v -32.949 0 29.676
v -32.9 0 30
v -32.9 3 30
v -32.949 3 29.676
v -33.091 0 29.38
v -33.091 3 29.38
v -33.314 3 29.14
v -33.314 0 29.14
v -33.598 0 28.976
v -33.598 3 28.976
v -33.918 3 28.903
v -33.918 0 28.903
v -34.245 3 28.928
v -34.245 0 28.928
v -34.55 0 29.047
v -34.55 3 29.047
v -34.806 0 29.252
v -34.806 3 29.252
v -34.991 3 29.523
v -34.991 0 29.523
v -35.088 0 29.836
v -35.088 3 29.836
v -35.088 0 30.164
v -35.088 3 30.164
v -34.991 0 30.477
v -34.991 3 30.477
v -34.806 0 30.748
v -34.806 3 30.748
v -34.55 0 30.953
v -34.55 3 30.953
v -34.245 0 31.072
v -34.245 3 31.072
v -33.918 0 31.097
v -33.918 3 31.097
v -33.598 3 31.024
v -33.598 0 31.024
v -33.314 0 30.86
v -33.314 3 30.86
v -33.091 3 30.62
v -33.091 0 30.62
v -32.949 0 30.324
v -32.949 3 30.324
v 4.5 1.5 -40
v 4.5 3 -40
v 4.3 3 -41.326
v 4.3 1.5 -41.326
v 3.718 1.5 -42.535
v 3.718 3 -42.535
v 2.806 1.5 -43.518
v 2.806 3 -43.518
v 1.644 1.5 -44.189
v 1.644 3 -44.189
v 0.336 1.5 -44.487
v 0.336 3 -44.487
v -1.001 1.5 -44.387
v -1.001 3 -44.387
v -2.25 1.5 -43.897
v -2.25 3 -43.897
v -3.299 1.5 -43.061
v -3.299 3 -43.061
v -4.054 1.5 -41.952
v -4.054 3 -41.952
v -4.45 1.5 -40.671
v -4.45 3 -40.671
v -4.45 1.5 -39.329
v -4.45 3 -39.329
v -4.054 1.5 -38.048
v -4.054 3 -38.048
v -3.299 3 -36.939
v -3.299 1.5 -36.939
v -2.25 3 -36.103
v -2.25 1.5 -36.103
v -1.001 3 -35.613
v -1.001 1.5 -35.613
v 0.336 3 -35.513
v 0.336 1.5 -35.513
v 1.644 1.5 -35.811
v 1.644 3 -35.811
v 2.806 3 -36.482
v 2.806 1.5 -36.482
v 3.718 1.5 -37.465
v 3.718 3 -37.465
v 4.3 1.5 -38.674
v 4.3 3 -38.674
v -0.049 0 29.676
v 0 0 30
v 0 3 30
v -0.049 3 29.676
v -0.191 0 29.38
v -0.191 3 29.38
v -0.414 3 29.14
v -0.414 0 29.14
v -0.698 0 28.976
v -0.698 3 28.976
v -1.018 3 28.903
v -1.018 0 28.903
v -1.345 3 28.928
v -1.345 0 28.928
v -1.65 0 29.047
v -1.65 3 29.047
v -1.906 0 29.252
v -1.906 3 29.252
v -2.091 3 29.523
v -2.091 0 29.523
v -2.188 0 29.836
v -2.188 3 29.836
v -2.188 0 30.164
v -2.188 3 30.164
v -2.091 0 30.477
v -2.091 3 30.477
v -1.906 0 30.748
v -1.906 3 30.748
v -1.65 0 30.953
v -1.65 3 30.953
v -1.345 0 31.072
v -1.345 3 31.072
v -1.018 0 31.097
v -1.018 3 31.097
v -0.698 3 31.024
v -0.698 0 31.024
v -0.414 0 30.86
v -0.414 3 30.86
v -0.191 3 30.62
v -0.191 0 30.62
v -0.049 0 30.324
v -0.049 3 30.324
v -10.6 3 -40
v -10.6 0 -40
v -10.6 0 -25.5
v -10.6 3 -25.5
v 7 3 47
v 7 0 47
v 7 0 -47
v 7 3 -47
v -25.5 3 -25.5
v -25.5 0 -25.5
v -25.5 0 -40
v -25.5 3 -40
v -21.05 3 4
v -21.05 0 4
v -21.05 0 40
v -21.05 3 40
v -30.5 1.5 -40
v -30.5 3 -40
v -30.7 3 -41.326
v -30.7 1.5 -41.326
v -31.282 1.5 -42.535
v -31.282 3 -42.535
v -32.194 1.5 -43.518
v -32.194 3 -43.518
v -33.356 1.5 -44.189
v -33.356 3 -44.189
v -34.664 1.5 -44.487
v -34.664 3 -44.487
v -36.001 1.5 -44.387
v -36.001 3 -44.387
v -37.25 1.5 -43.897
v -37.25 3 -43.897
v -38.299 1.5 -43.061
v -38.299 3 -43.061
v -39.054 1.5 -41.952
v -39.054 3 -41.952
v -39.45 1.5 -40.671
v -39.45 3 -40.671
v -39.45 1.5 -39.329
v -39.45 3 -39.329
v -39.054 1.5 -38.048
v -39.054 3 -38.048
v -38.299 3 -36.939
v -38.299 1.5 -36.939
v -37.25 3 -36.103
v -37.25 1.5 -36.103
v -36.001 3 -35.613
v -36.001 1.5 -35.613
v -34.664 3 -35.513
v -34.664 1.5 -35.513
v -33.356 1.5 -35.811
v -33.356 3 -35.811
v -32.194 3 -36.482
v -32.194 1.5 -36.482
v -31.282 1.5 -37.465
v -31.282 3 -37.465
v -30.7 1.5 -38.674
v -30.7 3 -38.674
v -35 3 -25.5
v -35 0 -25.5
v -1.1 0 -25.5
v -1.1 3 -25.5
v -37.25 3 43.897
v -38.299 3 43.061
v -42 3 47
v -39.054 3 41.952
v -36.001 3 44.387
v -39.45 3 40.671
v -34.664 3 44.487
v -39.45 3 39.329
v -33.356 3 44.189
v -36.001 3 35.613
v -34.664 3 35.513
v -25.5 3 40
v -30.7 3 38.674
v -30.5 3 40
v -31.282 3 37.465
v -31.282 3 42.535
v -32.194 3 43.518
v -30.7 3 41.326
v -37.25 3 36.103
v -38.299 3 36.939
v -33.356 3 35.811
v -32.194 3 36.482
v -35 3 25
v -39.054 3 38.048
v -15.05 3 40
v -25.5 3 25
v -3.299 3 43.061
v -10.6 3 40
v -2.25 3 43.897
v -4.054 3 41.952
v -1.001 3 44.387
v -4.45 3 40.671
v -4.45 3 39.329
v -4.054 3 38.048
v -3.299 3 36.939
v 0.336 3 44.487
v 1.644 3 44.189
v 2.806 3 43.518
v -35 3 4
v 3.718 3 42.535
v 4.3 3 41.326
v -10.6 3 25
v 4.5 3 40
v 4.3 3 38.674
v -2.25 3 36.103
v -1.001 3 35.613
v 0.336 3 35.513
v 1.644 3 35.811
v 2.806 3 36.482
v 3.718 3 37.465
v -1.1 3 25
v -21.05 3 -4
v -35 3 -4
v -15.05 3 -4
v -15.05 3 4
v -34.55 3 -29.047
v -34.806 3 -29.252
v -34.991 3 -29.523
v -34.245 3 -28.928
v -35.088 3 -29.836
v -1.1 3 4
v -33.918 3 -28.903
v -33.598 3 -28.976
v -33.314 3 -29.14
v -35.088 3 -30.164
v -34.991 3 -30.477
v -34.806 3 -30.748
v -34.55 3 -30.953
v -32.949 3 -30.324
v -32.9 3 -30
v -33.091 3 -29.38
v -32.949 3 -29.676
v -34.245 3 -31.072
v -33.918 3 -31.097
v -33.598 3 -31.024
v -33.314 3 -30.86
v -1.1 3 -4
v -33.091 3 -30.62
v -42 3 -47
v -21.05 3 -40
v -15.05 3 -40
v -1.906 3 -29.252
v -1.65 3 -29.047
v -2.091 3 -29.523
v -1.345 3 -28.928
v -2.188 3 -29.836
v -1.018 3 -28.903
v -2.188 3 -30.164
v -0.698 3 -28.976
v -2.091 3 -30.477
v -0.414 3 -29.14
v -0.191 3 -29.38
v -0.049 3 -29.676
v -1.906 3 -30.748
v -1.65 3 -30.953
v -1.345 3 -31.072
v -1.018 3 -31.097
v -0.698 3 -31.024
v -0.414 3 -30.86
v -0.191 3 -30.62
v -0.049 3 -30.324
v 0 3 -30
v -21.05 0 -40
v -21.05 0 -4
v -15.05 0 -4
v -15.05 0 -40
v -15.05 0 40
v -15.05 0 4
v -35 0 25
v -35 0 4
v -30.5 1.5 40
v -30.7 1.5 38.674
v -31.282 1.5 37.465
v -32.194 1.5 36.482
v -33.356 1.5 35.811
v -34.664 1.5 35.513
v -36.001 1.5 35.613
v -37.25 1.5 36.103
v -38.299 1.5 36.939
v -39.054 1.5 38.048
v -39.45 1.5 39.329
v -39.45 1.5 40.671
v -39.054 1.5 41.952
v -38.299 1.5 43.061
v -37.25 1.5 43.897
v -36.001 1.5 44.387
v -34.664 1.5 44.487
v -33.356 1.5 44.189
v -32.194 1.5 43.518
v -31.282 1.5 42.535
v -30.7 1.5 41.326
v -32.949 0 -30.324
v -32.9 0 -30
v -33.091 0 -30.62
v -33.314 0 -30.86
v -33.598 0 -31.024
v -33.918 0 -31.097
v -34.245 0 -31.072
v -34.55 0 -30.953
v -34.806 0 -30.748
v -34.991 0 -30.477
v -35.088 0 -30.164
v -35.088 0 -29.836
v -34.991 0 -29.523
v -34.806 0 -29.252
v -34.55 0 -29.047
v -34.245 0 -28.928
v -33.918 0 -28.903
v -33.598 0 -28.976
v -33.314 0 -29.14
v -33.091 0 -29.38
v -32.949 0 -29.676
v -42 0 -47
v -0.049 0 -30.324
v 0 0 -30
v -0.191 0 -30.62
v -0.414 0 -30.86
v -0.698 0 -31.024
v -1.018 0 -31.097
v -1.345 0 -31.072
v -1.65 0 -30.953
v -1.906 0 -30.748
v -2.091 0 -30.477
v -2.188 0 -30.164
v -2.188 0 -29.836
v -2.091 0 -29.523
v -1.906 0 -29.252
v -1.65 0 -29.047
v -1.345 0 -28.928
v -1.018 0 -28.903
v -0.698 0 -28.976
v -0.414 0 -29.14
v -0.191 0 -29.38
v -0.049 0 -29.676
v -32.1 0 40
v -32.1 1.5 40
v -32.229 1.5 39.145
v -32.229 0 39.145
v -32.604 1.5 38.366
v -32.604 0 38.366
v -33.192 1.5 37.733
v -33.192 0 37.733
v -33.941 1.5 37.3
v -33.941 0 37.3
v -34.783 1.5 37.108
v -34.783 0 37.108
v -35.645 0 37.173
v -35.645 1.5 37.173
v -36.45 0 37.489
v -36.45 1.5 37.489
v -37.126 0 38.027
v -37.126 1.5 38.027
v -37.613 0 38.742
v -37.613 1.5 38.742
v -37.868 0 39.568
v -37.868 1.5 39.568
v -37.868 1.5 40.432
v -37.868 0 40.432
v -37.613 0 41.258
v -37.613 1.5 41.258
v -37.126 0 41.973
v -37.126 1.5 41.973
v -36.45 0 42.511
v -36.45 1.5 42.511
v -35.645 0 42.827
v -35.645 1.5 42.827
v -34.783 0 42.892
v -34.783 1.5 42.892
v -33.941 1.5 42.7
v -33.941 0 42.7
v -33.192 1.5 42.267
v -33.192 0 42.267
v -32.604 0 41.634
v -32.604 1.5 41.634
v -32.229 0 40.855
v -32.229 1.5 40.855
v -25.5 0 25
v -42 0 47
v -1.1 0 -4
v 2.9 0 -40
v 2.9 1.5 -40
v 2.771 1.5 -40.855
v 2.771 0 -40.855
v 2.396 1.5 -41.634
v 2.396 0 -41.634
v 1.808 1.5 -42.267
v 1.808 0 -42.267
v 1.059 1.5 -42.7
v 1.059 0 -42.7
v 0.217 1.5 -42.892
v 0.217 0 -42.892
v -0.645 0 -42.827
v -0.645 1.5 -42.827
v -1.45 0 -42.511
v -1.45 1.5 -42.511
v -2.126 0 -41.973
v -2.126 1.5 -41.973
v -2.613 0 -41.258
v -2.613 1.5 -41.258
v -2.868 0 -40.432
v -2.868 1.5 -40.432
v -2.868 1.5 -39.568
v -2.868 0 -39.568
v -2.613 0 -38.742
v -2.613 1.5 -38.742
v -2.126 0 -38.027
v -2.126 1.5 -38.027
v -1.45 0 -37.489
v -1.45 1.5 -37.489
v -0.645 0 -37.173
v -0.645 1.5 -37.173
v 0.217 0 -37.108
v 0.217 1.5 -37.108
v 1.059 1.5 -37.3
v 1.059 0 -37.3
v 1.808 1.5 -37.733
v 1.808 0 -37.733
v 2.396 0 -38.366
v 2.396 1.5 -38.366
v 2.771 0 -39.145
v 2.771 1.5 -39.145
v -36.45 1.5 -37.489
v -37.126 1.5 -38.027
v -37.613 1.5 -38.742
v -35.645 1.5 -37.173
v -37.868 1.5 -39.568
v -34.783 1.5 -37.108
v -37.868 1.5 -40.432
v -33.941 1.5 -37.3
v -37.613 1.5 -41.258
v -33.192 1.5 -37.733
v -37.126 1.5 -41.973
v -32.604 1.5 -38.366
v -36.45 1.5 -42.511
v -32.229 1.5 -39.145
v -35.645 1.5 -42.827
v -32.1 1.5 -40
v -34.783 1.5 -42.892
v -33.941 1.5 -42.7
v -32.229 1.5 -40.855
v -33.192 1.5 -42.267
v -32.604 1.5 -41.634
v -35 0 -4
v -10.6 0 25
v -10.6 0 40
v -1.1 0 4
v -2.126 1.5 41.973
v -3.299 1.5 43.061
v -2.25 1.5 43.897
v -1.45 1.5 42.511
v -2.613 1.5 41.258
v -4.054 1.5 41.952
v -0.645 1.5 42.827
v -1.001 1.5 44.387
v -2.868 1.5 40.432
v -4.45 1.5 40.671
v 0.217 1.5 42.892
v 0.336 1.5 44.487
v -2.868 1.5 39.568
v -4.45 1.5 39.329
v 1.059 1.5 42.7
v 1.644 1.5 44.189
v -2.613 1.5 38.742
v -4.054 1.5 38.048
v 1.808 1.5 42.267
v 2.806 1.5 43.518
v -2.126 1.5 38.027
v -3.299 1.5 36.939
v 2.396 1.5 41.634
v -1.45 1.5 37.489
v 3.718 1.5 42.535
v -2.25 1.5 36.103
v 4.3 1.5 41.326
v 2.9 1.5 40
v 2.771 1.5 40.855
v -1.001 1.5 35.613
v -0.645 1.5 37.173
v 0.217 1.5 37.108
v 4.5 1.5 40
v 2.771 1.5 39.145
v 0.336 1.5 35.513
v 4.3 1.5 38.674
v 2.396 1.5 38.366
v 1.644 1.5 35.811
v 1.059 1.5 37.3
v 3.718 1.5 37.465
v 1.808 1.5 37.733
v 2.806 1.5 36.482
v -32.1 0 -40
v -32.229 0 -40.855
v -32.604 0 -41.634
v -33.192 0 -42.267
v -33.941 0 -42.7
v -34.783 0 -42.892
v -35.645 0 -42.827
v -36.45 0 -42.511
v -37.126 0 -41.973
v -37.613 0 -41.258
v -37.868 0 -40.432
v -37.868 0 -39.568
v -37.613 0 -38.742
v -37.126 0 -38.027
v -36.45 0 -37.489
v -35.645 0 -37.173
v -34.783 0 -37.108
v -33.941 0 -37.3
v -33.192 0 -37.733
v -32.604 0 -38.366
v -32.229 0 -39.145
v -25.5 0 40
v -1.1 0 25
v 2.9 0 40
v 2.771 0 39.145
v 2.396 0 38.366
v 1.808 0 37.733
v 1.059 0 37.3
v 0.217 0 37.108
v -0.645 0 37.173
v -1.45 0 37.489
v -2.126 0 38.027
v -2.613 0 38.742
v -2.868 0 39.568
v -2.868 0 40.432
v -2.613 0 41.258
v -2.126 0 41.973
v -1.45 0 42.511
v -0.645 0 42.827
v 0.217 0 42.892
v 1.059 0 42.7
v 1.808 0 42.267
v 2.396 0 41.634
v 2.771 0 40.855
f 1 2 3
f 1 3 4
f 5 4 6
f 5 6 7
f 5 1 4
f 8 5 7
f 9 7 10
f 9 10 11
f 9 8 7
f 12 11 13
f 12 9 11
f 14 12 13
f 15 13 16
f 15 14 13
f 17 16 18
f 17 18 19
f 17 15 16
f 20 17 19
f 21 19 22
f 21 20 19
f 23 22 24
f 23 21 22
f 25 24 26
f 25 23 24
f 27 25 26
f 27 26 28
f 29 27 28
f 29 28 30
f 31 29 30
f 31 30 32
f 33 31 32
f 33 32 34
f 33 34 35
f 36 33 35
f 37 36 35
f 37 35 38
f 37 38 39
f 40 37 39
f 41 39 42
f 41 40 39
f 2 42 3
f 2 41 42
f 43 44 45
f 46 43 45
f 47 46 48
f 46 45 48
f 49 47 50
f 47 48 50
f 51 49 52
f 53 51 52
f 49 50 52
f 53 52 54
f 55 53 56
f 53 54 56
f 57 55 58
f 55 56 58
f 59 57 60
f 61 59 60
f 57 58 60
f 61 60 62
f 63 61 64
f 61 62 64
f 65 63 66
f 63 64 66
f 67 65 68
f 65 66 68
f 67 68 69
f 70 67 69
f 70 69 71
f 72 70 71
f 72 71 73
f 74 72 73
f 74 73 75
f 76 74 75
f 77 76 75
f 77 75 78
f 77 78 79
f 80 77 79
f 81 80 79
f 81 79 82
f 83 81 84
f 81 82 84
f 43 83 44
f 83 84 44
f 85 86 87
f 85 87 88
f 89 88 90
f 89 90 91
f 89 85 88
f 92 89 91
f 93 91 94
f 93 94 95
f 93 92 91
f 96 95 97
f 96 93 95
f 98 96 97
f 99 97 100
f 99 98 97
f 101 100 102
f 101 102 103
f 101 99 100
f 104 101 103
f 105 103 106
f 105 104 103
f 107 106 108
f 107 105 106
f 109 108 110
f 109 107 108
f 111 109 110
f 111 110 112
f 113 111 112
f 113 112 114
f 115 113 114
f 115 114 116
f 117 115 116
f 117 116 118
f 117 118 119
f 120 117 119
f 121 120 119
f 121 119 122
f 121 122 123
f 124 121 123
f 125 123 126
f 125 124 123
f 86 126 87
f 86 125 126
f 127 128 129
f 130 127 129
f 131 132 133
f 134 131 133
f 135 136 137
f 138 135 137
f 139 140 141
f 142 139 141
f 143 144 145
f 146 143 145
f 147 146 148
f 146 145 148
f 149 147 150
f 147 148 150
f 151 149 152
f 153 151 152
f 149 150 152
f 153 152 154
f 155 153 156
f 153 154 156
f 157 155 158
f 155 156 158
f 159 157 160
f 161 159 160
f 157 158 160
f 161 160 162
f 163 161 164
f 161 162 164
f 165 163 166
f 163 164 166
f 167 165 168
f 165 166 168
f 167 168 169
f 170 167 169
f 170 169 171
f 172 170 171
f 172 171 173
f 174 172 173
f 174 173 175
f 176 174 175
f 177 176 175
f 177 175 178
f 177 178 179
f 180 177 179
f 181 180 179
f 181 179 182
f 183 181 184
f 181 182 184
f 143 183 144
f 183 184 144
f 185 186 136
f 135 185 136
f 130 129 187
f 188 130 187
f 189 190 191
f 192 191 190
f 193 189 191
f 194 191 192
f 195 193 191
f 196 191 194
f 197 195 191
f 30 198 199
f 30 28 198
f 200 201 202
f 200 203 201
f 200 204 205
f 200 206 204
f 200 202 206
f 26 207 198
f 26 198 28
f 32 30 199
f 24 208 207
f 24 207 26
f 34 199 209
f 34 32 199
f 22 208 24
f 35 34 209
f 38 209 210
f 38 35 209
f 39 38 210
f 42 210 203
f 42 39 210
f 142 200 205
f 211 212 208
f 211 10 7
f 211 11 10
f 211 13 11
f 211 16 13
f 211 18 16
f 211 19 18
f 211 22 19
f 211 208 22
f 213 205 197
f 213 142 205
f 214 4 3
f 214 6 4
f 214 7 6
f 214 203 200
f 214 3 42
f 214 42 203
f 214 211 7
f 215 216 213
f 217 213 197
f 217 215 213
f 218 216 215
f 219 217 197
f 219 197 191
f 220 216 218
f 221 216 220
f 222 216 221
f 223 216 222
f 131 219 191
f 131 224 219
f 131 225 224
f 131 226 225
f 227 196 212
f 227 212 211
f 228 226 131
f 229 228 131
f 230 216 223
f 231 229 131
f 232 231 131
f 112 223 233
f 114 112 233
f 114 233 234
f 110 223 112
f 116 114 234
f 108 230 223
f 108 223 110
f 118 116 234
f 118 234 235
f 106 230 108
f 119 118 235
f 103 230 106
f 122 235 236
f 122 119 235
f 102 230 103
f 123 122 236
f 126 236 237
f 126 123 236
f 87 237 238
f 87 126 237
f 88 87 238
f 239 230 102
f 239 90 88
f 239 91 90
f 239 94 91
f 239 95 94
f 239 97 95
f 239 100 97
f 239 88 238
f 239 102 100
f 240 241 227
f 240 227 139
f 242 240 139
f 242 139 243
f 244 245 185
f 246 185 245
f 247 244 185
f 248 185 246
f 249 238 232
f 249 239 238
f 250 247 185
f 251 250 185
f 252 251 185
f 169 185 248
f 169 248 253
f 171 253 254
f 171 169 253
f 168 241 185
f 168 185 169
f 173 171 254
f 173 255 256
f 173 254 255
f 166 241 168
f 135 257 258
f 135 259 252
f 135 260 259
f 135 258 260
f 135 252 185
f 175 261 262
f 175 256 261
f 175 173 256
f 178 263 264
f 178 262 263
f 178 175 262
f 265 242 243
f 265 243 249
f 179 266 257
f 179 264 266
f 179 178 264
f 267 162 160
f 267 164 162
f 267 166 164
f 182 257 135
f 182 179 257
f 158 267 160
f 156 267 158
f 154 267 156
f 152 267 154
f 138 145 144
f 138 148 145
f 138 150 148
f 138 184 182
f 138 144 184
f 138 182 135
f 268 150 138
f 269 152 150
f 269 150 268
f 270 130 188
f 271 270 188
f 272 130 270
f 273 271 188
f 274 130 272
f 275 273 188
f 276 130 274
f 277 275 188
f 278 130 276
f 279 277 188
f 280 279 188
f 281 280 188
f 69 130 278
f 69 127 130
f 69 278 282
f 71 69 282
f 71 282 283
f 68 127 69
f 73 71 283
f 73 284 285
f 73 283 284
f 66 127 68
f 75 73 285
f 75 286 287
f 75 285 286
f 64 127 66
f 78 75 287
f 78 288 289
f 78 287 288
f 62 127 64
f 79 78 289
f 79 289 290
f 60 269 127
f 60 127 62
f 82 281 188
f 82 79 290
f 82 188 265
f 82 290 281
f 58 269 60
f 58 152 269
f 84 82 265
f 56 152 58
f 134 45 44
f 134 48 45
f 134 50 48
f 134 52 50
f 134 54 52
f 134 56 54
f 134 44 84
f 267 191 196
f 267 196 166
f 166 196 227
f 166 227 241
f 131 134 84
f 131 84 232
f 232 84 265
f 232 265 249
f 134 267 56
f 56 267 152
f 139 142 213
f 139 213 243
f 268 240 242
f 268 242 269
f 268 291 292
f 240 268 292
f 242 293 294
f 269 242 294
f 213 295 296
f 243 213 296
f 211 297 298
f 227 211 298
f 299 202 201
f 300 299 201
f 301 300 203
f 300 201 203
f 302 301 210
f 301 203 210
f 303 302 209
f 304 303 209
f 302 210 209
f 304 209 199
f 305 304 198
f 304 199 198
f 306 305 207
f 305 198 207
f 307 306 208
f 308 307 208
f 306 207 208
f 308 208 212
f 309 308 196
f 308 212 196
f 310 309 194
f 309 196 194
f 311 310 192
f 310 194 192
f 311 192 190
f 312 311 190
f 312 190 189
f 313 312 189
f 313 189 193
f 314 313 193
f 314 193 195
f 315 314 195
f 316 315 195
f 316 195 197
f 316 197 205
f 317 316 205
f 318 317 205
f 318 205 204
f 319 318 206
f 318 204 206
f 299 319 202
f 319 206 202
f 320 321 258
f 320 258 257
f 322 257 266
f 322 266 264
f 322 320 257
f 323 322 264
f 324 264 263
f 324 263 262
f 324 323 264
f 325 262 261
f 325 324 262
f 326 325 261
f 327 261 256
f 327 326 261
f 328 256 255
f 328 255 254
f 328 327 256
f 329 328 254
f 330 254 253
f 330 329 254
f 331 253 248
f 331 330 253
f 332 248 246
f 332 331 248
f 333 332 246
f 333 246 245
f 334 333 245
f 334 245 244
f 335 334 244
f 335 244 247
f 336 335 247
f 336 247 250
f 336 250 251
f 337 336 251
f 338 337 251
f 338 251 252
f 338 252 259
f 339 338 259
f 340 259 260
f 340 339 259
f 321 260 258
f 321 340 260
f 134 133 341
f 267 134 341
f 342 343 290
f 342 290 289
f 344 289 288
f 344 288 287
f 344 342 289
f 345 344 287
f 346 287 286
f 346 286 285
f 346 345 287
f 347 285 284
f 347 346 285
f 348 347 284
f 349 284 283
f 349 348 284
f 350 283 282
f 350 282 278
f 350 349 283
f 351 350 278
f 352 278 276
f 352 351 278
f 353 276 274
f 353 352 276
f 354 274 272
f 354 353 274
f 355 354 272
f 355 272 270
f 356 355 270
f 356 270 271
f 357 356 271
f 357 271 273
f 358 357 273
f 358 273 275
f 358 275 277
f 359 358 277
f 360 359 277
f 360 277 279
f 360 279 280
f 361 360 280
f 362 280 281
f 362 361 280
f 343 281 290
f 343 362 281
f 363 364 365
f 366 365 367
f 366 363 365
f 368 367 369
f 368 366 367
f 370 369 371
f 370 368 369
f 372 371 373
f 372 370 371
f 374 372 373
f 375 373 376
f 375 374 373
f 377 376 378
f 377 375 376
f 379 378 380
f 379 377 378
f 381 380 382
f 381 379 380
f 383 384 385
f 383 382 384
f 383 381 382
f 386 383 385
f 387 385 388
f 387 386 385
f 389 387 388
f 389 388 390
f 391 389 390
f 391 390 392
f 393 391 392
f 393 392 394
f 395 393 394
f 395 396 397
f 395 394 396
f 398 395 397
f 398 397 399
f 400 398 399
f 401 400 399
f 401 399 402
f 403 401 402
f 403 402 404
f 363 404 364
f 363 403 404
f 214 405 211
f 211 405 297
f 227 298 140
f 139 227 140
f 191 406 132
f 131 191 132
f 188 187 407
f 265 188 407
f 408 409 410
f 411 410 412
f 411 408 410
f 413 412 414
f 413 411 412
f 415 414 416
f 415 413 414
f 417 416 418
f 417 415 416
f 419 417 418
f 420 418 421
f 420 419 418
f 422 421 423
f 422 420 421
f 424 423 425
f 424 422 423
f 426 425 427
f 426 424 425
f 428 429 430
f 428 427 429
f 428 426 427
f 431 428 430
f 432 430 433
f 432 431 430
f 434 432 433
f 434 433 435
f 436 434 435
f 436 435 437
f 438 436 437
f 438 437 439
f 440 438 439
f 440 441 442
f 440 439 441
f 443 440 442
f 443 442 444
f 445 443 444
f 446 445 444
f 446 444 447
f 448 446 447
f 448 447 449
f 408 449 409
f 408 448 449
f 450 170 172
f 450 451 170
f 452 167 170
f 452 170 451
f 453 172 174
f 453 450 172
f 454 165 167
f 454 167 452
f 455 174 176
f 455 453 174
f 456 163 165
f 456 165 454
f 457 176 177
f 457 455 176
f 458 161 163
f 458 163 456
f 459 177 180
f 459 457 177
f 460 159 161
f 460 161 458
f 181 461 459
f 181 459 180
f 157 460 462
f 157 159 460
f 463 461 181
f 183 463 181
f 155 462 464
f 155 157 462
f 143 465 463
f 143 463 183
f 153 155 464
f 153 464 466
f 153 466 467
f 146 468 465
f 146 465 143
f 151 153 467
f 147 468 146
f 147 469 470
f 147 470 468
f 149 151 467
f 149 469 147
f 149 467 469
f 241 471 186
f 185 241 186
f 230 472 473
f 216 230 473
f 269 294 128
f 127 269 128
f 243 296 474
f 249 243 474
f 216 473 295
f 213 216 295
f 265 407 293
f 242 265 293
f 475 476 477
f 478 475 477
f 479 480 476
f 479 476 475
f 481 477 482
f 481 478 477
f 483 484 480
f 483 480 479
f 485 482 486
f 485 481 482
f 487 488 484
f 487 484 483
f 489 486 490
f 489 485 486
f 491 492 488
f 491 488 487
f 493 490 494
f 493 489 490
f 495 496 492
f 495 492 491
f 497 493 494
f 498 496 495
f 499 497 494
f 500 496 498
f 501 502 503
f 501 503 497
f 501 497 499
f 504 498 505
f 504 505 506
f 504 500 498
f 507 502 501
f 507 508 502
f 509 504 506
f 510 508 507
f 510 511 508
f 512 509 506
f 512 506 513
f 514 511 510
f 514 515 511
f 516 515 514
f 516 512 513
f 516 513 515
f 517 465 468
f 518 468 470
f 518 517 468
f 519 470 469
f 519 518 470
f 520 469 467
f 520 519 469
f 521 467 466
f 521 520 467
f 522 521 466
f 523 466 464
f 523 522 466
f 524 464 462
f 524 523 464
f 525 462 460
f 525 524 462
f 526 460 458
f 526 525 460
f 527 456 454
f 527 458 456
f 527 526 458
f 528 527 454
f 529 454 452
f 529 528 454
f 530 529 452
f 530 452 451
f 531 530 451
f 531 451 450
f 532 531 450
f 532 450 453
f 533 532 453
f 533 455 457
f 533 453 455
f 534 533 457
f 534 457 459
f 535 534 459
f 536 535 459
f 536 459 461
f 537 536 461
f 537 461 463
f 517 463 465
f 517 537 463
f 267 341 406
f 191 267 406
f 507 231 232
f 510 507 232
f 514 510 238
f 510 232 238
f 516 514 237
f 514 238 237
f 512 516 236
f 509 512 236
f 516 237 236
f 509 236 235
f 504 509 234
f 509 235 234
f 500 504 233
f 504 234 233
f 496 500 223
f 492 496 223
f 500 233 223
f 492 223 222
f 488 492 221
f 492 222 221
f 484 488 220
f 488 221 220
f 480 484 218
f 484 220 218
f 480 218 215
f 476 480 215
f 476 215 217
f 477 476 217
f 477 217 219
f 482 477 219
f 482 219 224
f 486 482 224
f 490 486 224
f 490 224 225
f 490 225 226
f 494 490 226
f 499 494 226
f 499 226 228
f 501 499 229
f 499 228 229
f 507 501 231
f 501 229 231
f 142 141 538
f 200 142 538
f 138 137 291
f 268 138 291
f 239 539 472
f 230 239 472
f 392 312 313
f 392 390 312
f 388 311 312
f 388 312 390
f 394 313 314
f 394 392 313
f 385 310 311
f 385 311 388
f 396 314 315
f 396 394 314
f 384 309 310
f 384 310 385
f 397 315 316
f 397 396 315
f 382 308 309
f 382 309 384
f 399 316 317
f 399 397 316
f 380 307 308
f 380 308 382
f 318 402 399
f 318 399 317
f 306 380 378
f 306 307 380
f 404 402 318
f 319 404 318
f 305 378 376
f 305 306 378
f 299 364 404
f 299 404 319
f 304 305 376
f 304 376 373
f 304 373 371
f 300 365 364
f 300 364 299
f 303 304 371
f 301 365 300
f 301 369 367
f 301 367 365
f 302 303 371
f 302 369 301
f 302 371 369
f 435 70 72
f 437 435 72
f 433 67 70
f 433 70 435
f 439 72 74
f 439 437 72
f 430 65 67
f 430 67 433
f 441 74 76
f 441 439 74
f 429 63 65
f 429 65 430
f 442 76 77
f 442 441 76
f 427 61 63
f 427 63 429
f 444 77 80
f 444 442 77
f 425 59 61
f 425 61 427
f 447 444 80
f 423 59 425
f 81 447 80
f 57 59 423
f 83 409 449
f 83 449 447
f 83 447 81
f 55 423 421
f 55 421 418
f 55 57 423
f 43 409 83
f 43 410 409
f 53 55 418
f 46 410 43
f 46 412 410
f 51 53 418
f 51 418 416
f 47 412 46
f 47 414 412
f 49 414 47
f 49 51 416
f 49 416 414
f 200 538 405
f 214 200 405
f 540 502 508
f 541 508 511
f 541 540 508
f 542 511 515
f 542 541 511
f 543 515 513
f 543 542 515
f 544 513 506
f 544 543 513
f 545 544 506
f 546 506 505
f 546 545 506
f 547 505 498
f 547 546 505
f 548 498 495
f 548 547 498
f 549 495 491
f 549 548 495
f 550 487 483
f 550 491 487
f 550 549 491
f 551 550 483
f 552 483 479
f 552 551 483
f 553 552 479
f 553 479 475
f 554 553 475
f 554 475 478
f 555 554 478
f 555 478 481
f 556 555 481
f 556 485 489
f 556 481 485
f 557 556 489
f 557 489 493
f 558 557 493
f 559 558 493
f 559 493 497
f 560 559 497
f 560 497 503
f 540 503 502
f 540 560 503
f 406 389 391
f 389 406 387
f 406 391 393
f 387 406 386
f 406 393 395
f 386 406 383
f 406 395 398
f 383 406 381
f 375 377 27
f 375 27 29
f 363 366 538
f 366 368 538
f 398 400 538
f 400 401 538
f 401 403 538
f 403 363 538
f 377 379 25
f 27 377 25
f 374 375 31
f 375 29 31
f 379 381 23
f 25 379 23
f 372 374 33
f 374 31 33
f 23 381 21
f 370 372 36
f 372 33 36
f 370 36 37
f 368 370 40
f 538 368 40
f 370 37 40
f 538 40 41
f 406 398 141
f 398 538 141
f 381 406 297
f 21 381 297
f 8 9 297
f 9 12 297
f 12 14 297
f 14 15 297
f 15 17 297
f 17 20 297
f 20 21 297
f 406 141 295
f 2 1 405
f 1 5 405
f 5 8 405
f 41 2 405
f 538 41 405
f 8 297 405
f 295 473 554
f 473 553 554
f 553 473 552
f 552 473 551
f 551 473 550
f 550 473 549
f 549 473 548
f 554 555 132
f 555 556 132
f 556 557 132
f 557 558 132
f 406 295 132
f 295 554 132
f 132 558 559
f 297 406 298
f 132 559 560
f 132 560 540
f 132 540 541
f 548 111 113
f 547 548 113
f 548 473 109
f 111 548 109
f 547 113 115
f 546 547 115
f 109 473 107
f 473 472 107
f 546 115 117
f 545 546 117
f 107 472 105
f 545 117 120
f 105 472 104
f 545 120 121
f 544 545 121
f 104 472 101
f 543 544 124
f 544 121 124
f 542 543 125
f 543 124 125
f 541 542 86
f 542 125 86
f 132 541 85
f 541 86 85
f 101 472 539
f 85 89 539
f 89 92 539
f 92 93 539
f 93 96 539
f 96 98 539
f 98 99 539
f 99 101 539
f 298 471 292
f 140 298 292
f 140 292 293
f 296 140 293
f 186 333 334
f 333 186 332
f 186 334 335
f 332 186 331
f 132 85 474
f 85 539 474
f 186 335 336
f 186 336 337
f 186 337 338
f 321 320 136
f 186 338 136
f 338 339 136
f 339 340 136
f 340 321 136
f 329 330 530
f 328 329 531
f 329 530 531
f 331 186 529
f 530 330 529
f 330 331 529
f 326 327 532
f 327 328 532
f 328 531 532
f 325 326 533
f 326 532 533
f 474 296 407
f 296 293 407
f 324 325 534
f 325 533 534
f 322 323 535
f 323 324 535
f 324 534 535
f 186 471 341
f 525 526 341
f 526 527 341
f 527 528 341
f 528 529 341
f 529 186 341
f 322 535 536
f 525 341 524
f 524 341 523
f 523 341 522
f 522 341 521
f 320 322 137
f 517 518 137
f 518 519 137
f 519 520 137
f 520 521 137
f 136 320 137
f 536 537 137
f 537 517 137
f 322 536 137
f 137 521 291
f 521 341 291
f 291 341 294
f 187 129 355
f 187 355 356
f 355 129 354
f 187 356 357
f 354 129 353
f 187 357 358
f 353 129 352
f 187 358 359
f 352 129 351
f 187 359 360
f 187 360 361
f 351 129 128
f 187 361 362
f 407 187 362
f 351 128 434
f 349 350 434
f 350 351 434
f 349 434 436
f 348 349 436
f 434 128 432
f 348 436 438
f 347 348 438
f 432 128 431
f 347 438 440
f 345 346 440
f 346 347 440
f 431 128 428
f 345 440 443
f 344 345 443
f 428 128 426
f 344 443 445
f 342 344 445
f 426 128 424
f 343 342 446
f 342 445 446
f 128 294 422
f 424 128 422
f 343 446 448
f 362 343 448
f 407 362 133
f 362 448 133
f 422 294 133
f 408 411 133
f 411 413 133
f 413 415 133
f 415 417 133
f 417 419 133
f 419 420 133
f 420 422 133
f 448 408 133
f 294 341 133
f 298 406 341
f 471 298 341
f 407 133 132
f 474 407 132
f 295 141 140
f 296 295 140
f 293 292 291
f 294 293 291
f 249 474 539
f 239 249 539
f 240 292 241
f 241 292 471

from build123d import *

# Parameters (mm, degrees)
SKETCH_1_R          = 2.9
SKETCH_1_R_2        = 1.1
EXTRUDE_1_DEPTH     = 3
SKETCH_2_R          = 4.5
CUT_EXTRUDE_1_DEPTH = 1.5


with BuildPart() as part:
    # 草图1 → 凸台-拉伸1 (new body)
    with BuildSketch(Plane(origin=(0, 0, 0), x_dir=(1, 0, 0), z_dir=(0, 1, 0))):
        Polygon((-42, 47), (-42, 0), (-42, -47), (0, -47), (7, -47), (7, 47), (0, 47), align=None)
        with Locations((-35, -40)):
            Circle(SKETCH_1_R, mode=Mode.SUBTRACT)
        with Locations((-34, -30)):
            Circle(SKETCH_1_R_2, mode=Mode.SUBTRACT)
        Polygon((-35, -25), (-35, -4), (-21.05, -4), (-21.05, -40), (-25.5, -40), (-25.5, -25), align=None, mode=Mode.SUBTRACT)
        with Locations((0, -40)):
            Circle(SKETCH_1_R, mode=Mode.SUBTRACT)
        with Locations((-1.1, -30)):
            Circle(SKETCH_1_R_2, mode=Mode.SUBTRACT)
        Polygon((-1.1, -4), (-1.1, -25), (-10.6, -25), (-10.6, -40), (-15.05, -40), (-15.05, -4), align=None, mode=Mode.SUBTRACT)
        Polygon((-21.05, 4), (-35, 4), (-35, 25.5), (-25.5, 25.5), (-25.5, 40), (-21.05, 40), align=None, mode=Mode.SUBTRACT)
        with Locations((-34, 30)):
            Circle(SKETCH_1_R_2, mode=Mode.SUBTRACT)
        with Locations((-35, 40)):
            Circle(SKETCH_1_R, mode=Mode.SUBTRACT)
        Polygon((-10.6, 25.5), (-1.1, 25.5), (-1.1, 4), (-15.05, 4), (-15.05, 40), (-10.6, 40), align=None, mode=Mode.SUBTRACT)
        with Locations((-1.1, 30)):
            Circle(SKETCH_1_R_2, mode=Mode.SUBTRACT)
        with Locations((0, 40)):
            Circle(SKETCH_1_R, mode=Mode.SUBTRACT)
    extrude(amount=EXTRUDE_1_DEPTH)

    # 草图2 → 切除-拉伸1 (cut)
    with BuildSketch(Plane(origin=(0, 3, 0), x_dir=(1, 0, 0), z_dir=(0, 1, 0))):
        with Locations((-35, 40)):
            Circle(SKETCH_2_R)
        with Locations((0, 40)):
            Circle(SKETCH_2_R)
        with Locations((0, -40)):
            Circle(SKETCH_2_R)
        with Locations((-35, -40)):
            Circle(SKETCH_2_R)
    extrude(amount=-CUT_EXTRUDE_1_DEPTH, mode=Mode.SUBTRACT)


solid = part.part
